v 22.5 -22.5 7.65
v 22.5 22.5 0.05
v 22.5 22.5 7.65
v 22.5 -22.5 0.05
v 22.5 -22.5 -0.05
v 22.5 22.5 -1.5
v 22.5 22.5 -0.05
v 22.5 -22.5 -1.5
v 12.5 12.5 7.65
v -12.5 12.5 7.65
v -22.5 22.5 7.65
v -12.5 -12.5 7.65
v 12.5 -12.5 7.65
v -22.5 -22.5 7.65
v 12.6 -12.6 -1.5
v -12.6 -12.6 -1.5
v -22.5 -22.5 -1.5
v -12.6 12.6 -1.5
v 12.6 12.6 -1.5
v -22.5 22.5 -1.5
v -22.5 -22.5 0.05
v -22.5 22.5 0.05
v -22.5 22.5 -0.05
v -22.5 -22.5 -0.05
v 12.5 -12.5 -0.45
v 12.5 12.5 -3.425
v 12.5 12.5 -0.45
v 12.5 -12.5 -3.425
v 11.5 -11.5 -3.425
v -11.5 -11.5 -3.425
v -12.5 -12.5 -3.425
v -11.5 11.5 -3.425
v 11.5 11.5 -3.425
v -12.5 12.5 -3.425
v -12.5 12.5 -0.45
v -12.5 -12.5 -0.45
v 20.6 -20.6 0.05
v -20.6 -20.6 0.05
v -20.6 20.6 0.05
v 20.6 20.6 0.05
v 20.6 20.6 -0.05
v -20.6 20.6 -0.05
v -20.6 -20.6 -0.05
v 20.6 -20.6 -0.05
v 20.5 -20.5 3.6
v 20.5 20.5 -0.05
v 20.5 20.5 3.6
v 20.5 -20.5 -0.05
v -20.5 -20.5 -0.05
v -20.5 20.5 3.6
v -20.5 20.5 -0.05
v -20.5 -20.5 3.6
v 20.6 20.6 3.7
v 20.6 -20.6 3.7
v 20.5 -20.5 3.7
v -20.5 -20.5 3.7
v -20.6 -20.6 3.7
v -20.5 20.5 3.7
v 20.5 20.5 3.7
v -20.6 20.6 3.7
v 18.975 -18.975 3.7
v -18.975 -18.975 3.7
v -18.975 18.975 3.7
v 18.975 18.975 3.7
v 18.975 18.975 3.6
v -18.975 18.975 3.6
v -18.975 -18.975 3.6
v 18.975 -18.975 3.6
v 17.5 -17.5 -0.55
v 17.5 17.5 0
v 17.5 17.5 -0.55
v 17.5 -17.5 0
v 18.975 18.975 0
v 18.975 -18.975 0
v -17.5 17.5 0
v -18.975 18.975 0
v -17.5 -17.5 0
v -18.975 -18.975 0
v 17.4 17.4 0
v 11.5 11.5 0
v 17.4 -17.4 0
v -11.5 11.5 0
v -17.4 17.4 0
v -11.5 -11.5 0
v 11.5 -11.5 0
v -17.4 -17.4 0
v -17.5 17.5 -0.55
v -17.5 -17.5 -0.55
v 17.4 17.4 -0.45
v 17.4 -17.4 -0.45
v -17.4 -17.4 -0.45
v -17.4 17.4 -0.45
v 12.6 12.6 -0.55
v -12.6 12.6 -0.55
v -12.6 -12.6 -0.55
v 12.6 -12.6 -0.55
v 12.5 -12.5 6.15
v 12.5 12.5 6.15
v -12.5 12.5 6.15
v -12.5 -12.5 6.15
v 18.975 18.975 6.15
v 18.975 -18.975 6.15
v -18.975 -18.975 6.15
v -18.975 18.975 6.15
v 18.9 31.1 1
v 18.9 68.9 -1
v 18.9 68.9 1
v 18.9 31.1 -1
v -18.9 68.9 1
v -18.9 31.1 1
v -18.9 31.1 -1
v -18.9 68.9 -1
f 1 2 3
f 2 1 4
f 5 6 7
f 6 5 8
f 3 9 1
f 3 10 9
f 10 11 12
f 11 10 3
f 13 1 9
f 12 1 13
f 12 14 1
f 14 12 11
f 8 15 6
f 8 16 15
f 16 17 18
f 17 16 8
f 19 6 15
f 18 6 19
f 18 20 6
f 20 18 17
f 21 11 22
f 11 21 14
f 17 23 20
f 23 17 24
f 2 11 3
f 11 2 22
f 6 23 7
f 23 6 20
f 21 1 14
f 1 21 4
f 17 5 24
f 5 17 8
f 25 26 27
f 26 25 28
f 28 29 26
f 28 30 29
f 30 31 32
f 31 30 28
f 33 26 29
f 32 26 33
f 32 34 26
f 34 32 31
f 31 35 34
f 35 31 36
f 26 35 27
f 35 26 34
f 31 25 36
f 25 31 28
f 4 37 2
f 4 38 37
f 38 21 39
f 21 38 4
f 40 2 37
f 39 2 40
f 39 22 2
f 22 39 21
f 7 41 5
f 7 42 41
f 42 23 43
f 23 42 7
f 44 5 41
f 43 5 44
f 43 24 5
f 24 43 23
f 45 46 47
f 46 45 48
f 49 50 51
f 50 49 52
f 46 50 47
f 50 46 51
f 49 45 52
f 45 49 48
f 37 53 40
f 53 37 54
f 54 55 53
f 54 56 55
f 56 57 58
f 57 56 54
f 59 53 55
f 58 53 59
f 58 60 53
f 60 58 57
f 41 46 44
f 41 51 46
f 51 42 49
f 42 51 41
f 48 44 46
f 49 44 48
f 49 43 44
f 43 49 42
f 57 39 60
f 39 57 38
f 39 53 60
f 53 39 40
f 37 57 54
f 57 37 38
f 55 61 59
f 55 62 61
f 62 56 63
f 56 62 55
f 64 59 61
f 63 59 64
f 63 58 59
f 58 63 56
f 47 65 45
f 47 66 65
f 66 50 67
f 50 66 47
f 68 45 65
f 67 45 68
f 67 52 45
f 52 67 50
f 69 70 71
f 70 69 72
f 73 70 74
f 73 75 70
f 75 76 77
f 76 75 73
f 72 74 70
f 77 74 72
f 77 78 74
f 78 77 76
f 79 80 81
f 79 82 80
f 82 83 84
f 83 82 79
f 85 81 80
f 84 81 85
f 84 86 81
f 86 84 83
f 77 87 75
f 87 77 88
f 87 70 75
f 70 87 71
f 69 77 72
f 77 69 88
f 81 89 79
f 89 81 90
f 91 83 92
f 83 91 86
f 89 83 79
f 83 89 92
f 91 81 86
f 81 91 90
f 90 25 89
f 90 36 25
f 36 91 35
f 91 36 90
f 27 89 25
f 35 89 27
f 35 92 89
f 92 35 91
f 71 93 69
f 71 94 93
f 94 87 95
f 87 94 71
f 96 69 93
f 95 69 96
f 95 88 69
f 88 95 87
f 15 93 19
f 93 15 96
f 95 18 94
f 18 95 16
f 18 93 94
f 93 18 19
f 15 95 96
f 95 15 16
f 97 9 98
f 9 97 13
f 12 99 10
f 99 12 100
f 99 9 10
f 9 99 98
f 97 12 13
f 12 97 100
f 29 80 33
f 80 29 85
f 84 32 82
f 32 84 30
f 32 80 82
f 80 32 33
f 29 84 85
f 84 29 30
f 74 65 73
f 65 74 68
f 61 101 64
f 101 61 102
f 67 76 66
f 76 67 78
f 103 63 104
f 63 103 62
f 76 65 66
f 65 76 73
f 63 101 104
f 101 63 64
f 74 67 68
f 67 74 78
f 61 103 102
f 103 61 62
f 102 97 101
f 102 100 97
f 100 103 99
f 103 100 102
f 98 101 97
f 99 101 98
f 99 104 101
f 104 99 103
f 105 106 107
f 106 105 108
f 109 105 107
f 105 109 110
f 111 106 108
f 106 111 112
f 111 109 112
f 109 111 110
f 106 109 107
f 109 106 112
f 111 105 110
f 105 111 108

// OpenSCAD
// created by AkytharPandaaa
// encoding: utf-8

/* tolerance:
  0.1 tight fit
  0.15 fits
  0.2 loose fit */

$fn = $preview ? 25 : 125;

// HS = heat spreader

DEBUG_MODE = false;

FRAME_WIDTH_SQUARE = 45;
ESD_FOAM_THICKNESS = 1.5;

CPU_INTEL_3000 = [37.8, 37.8, 4.5];

cpu = CPU_INTEL_3000;

module cpu_dummy(cpu_size, tolerance = .15) {
  translate(v=[0, 0, cpu_size.z / 2 + tolerance / 2]) cube(size=[cpu_size.x + tolerance, cpu_size.y + tolerance, cpu_size.z + tolerance], center=true);
}

module frame(cpu_size, esd_foam_thickness, tolerance = .15) {
  module split_frame(thickness = .1) {
    color(c="orange", alpha=1.0) union() {
        difference() {
          cube(size=[FRAME_WIDTH_SQUARE + 2, FRAME_WIDTH_SQUARE + 2, thickness], center=true);
          cube(size=[FRAME_WIDTH_SQUARE - 4, FRAME_WIDTH_SQUARE - 4, thickness + .2], center=true);
        }
        translate(v=[0, 0, -thickness / 2 + (esd_foam_thickness + cpu_size[2] / 2) / 2]) difference() {
            cube(size=[FRAME_WIDTH_SQUARE - 4 + thickness * 2, FRAME_WIDTH_SQUARE - 4 + thickness * 2, esd_foam_thickness + cpu_size[2] / 2], center=true);
            cube(size=[FRAME_WIDTH_SQUARE - 4, FRAME_WIDTH_SQUARE - 4, (esd_foam_thickness + cpu_size[2] / 2) + .2], center=true);
          }
        translate(v=[0, 0, esd_foam_thickness + cpu_size[2] / 2 - thickness])
          cube(size=[FRAME_WIDTH_SQUARE - 4 + thickness * 2, FRAME_WIDTH_SQUARE - 4 + thickness * 2, thickness], center=true);
      }
  }

  module split_stack(thickness = .1) {
    color(c="orange", alpha=1.0) union() {
        translate(v=[0, 0, -.5 / 2]) difference() {
            cube(size=[FRAME_WIDTH_SQUARE - 10, FRAME_WIDTH_SQUARE - 10, .5], center=true);
            cube(size=[FRAME_WIDTH_SQUARE - 10 - thickness * 2, FRAME_WIDTH_SQUARE - 10 - thickness * 2, .5 + .2], center=true);
          }
        translate(v=[0, 0, -.5]) difference() {
            cube(size=[FRAME_WIDTH_SQUARE - 10, FRAME_WIDTH_SQUARE - 10, thickness], center=true);
            cube(size=[FRAME_WIDTH_SQUARE - 20, FRAME_WIDTH_SQUARE - 20, thickness + .2], center=true);
          }
        translate(v=[0, 0, -.5 - 1.5]) difference() {
            cube(size=[FRAME_WIDTH_SQUARE - 20 + thickness * 2, FRAME_WIDTH_SQUARE - 20 + thickness * 2, 3], center=true);
            cube(size=[FRAME_WIDTH_SQUARE - 20, FRAME_WIDTH_SQUARE - 20, 3 + .2], center=true);
          }
      }
  }

  foam_height = esd_foam_thickness + (esd_foam_thickness == 0 ? 0 : tolerance);
  frame_top_thickness = 1.5;
  frame_bottom_thickness = 1.5;
  frame_height = cpu_size[2] + foam_height + (frame_top_thickness + frame_bottom_thickness);

  difference() {
    // BASE
    translate(v=[0, 0, frame_height / 2 - frame_bottom_thickness]) union() {
        cube([FRAME_WIDTH_SQUARE, FRAME_WIDTH_SQUARE, frame_height], center=true);
        //FIX: translate z, needs manual correction if ESD_FOAM_THICKNESS changes
        translate(v=[0, 0, -5.5]) cube([FRAME_WIDTH_SQUARE - 20, FRAME_WIDTH_SQUARE - 20, 2], center=true);
      }

    // CUTOUT VIEW
    translate(v=[0, 0, frame_height / 2 + .1]) cube(size=[FRAME_WIDTH_SQUARE - 20, FRAME_WIDTH_SQUARE - 20, frame_height + .2], center=true);

    // CUTOUT bottom
    translate(v=[0, 0, -frame_height / 2]) cube(size=[FRAME_WIDTH_SQUARE - 22, FRAME_WIDTH_SQUARE - 22, frame_height + .2], center=true);

    // CUTOUT FOAM
    translate(v=[0, 0, foam_height / 2]) cube(size=[cpu_size[0] + tolerance, cpu_size[1] + tolerance, foam_height], center=true);

    // CUT SPLIT POINT
    translate(v=[0, 0, 0]) split_frame(thickness=.1);

    // CUT SPLIT STACK
    translate(v=[0, 0, 0]) split_stack(thickness=.1);
  }
}

difference() {
  frame(cpu_size=cpu, esd_foam_thickness=ESD_FOAM_THICKNESS, tolerance=.15);

  if (DEBUG_MODE) {
    difference() {
      translate(v=[0, 0, ESD_FOAM_THICKNESS]) color(c="aqua", alpha=1.0) cpu_dummy(cpu_size=cpu, tolerance=.15);
      translate(v=[0, 0, ESD_FOAM_THICKNESS]) color(c="aqua", alpha=1.0) cpu_dummy(cpu_size=cpu, tolerance=.05);
    }
  } else {
    translate(v=[0, 0, ESD_FOAM_THICKNESS]) cpu_dummy(cpu_size=cpu, tolerance=.15);
  }

  if (DEBUG_MODE)
    translate(v=[0, 0, -5]) cube(30);
}

// pcb cutting guide for the foam
if (ESD_FOAM_THICKNESS != 0) {
  translate(v=[0, 50, 0]) cube(size=[cpu.x, cpu.y, 2], center=true);
}
